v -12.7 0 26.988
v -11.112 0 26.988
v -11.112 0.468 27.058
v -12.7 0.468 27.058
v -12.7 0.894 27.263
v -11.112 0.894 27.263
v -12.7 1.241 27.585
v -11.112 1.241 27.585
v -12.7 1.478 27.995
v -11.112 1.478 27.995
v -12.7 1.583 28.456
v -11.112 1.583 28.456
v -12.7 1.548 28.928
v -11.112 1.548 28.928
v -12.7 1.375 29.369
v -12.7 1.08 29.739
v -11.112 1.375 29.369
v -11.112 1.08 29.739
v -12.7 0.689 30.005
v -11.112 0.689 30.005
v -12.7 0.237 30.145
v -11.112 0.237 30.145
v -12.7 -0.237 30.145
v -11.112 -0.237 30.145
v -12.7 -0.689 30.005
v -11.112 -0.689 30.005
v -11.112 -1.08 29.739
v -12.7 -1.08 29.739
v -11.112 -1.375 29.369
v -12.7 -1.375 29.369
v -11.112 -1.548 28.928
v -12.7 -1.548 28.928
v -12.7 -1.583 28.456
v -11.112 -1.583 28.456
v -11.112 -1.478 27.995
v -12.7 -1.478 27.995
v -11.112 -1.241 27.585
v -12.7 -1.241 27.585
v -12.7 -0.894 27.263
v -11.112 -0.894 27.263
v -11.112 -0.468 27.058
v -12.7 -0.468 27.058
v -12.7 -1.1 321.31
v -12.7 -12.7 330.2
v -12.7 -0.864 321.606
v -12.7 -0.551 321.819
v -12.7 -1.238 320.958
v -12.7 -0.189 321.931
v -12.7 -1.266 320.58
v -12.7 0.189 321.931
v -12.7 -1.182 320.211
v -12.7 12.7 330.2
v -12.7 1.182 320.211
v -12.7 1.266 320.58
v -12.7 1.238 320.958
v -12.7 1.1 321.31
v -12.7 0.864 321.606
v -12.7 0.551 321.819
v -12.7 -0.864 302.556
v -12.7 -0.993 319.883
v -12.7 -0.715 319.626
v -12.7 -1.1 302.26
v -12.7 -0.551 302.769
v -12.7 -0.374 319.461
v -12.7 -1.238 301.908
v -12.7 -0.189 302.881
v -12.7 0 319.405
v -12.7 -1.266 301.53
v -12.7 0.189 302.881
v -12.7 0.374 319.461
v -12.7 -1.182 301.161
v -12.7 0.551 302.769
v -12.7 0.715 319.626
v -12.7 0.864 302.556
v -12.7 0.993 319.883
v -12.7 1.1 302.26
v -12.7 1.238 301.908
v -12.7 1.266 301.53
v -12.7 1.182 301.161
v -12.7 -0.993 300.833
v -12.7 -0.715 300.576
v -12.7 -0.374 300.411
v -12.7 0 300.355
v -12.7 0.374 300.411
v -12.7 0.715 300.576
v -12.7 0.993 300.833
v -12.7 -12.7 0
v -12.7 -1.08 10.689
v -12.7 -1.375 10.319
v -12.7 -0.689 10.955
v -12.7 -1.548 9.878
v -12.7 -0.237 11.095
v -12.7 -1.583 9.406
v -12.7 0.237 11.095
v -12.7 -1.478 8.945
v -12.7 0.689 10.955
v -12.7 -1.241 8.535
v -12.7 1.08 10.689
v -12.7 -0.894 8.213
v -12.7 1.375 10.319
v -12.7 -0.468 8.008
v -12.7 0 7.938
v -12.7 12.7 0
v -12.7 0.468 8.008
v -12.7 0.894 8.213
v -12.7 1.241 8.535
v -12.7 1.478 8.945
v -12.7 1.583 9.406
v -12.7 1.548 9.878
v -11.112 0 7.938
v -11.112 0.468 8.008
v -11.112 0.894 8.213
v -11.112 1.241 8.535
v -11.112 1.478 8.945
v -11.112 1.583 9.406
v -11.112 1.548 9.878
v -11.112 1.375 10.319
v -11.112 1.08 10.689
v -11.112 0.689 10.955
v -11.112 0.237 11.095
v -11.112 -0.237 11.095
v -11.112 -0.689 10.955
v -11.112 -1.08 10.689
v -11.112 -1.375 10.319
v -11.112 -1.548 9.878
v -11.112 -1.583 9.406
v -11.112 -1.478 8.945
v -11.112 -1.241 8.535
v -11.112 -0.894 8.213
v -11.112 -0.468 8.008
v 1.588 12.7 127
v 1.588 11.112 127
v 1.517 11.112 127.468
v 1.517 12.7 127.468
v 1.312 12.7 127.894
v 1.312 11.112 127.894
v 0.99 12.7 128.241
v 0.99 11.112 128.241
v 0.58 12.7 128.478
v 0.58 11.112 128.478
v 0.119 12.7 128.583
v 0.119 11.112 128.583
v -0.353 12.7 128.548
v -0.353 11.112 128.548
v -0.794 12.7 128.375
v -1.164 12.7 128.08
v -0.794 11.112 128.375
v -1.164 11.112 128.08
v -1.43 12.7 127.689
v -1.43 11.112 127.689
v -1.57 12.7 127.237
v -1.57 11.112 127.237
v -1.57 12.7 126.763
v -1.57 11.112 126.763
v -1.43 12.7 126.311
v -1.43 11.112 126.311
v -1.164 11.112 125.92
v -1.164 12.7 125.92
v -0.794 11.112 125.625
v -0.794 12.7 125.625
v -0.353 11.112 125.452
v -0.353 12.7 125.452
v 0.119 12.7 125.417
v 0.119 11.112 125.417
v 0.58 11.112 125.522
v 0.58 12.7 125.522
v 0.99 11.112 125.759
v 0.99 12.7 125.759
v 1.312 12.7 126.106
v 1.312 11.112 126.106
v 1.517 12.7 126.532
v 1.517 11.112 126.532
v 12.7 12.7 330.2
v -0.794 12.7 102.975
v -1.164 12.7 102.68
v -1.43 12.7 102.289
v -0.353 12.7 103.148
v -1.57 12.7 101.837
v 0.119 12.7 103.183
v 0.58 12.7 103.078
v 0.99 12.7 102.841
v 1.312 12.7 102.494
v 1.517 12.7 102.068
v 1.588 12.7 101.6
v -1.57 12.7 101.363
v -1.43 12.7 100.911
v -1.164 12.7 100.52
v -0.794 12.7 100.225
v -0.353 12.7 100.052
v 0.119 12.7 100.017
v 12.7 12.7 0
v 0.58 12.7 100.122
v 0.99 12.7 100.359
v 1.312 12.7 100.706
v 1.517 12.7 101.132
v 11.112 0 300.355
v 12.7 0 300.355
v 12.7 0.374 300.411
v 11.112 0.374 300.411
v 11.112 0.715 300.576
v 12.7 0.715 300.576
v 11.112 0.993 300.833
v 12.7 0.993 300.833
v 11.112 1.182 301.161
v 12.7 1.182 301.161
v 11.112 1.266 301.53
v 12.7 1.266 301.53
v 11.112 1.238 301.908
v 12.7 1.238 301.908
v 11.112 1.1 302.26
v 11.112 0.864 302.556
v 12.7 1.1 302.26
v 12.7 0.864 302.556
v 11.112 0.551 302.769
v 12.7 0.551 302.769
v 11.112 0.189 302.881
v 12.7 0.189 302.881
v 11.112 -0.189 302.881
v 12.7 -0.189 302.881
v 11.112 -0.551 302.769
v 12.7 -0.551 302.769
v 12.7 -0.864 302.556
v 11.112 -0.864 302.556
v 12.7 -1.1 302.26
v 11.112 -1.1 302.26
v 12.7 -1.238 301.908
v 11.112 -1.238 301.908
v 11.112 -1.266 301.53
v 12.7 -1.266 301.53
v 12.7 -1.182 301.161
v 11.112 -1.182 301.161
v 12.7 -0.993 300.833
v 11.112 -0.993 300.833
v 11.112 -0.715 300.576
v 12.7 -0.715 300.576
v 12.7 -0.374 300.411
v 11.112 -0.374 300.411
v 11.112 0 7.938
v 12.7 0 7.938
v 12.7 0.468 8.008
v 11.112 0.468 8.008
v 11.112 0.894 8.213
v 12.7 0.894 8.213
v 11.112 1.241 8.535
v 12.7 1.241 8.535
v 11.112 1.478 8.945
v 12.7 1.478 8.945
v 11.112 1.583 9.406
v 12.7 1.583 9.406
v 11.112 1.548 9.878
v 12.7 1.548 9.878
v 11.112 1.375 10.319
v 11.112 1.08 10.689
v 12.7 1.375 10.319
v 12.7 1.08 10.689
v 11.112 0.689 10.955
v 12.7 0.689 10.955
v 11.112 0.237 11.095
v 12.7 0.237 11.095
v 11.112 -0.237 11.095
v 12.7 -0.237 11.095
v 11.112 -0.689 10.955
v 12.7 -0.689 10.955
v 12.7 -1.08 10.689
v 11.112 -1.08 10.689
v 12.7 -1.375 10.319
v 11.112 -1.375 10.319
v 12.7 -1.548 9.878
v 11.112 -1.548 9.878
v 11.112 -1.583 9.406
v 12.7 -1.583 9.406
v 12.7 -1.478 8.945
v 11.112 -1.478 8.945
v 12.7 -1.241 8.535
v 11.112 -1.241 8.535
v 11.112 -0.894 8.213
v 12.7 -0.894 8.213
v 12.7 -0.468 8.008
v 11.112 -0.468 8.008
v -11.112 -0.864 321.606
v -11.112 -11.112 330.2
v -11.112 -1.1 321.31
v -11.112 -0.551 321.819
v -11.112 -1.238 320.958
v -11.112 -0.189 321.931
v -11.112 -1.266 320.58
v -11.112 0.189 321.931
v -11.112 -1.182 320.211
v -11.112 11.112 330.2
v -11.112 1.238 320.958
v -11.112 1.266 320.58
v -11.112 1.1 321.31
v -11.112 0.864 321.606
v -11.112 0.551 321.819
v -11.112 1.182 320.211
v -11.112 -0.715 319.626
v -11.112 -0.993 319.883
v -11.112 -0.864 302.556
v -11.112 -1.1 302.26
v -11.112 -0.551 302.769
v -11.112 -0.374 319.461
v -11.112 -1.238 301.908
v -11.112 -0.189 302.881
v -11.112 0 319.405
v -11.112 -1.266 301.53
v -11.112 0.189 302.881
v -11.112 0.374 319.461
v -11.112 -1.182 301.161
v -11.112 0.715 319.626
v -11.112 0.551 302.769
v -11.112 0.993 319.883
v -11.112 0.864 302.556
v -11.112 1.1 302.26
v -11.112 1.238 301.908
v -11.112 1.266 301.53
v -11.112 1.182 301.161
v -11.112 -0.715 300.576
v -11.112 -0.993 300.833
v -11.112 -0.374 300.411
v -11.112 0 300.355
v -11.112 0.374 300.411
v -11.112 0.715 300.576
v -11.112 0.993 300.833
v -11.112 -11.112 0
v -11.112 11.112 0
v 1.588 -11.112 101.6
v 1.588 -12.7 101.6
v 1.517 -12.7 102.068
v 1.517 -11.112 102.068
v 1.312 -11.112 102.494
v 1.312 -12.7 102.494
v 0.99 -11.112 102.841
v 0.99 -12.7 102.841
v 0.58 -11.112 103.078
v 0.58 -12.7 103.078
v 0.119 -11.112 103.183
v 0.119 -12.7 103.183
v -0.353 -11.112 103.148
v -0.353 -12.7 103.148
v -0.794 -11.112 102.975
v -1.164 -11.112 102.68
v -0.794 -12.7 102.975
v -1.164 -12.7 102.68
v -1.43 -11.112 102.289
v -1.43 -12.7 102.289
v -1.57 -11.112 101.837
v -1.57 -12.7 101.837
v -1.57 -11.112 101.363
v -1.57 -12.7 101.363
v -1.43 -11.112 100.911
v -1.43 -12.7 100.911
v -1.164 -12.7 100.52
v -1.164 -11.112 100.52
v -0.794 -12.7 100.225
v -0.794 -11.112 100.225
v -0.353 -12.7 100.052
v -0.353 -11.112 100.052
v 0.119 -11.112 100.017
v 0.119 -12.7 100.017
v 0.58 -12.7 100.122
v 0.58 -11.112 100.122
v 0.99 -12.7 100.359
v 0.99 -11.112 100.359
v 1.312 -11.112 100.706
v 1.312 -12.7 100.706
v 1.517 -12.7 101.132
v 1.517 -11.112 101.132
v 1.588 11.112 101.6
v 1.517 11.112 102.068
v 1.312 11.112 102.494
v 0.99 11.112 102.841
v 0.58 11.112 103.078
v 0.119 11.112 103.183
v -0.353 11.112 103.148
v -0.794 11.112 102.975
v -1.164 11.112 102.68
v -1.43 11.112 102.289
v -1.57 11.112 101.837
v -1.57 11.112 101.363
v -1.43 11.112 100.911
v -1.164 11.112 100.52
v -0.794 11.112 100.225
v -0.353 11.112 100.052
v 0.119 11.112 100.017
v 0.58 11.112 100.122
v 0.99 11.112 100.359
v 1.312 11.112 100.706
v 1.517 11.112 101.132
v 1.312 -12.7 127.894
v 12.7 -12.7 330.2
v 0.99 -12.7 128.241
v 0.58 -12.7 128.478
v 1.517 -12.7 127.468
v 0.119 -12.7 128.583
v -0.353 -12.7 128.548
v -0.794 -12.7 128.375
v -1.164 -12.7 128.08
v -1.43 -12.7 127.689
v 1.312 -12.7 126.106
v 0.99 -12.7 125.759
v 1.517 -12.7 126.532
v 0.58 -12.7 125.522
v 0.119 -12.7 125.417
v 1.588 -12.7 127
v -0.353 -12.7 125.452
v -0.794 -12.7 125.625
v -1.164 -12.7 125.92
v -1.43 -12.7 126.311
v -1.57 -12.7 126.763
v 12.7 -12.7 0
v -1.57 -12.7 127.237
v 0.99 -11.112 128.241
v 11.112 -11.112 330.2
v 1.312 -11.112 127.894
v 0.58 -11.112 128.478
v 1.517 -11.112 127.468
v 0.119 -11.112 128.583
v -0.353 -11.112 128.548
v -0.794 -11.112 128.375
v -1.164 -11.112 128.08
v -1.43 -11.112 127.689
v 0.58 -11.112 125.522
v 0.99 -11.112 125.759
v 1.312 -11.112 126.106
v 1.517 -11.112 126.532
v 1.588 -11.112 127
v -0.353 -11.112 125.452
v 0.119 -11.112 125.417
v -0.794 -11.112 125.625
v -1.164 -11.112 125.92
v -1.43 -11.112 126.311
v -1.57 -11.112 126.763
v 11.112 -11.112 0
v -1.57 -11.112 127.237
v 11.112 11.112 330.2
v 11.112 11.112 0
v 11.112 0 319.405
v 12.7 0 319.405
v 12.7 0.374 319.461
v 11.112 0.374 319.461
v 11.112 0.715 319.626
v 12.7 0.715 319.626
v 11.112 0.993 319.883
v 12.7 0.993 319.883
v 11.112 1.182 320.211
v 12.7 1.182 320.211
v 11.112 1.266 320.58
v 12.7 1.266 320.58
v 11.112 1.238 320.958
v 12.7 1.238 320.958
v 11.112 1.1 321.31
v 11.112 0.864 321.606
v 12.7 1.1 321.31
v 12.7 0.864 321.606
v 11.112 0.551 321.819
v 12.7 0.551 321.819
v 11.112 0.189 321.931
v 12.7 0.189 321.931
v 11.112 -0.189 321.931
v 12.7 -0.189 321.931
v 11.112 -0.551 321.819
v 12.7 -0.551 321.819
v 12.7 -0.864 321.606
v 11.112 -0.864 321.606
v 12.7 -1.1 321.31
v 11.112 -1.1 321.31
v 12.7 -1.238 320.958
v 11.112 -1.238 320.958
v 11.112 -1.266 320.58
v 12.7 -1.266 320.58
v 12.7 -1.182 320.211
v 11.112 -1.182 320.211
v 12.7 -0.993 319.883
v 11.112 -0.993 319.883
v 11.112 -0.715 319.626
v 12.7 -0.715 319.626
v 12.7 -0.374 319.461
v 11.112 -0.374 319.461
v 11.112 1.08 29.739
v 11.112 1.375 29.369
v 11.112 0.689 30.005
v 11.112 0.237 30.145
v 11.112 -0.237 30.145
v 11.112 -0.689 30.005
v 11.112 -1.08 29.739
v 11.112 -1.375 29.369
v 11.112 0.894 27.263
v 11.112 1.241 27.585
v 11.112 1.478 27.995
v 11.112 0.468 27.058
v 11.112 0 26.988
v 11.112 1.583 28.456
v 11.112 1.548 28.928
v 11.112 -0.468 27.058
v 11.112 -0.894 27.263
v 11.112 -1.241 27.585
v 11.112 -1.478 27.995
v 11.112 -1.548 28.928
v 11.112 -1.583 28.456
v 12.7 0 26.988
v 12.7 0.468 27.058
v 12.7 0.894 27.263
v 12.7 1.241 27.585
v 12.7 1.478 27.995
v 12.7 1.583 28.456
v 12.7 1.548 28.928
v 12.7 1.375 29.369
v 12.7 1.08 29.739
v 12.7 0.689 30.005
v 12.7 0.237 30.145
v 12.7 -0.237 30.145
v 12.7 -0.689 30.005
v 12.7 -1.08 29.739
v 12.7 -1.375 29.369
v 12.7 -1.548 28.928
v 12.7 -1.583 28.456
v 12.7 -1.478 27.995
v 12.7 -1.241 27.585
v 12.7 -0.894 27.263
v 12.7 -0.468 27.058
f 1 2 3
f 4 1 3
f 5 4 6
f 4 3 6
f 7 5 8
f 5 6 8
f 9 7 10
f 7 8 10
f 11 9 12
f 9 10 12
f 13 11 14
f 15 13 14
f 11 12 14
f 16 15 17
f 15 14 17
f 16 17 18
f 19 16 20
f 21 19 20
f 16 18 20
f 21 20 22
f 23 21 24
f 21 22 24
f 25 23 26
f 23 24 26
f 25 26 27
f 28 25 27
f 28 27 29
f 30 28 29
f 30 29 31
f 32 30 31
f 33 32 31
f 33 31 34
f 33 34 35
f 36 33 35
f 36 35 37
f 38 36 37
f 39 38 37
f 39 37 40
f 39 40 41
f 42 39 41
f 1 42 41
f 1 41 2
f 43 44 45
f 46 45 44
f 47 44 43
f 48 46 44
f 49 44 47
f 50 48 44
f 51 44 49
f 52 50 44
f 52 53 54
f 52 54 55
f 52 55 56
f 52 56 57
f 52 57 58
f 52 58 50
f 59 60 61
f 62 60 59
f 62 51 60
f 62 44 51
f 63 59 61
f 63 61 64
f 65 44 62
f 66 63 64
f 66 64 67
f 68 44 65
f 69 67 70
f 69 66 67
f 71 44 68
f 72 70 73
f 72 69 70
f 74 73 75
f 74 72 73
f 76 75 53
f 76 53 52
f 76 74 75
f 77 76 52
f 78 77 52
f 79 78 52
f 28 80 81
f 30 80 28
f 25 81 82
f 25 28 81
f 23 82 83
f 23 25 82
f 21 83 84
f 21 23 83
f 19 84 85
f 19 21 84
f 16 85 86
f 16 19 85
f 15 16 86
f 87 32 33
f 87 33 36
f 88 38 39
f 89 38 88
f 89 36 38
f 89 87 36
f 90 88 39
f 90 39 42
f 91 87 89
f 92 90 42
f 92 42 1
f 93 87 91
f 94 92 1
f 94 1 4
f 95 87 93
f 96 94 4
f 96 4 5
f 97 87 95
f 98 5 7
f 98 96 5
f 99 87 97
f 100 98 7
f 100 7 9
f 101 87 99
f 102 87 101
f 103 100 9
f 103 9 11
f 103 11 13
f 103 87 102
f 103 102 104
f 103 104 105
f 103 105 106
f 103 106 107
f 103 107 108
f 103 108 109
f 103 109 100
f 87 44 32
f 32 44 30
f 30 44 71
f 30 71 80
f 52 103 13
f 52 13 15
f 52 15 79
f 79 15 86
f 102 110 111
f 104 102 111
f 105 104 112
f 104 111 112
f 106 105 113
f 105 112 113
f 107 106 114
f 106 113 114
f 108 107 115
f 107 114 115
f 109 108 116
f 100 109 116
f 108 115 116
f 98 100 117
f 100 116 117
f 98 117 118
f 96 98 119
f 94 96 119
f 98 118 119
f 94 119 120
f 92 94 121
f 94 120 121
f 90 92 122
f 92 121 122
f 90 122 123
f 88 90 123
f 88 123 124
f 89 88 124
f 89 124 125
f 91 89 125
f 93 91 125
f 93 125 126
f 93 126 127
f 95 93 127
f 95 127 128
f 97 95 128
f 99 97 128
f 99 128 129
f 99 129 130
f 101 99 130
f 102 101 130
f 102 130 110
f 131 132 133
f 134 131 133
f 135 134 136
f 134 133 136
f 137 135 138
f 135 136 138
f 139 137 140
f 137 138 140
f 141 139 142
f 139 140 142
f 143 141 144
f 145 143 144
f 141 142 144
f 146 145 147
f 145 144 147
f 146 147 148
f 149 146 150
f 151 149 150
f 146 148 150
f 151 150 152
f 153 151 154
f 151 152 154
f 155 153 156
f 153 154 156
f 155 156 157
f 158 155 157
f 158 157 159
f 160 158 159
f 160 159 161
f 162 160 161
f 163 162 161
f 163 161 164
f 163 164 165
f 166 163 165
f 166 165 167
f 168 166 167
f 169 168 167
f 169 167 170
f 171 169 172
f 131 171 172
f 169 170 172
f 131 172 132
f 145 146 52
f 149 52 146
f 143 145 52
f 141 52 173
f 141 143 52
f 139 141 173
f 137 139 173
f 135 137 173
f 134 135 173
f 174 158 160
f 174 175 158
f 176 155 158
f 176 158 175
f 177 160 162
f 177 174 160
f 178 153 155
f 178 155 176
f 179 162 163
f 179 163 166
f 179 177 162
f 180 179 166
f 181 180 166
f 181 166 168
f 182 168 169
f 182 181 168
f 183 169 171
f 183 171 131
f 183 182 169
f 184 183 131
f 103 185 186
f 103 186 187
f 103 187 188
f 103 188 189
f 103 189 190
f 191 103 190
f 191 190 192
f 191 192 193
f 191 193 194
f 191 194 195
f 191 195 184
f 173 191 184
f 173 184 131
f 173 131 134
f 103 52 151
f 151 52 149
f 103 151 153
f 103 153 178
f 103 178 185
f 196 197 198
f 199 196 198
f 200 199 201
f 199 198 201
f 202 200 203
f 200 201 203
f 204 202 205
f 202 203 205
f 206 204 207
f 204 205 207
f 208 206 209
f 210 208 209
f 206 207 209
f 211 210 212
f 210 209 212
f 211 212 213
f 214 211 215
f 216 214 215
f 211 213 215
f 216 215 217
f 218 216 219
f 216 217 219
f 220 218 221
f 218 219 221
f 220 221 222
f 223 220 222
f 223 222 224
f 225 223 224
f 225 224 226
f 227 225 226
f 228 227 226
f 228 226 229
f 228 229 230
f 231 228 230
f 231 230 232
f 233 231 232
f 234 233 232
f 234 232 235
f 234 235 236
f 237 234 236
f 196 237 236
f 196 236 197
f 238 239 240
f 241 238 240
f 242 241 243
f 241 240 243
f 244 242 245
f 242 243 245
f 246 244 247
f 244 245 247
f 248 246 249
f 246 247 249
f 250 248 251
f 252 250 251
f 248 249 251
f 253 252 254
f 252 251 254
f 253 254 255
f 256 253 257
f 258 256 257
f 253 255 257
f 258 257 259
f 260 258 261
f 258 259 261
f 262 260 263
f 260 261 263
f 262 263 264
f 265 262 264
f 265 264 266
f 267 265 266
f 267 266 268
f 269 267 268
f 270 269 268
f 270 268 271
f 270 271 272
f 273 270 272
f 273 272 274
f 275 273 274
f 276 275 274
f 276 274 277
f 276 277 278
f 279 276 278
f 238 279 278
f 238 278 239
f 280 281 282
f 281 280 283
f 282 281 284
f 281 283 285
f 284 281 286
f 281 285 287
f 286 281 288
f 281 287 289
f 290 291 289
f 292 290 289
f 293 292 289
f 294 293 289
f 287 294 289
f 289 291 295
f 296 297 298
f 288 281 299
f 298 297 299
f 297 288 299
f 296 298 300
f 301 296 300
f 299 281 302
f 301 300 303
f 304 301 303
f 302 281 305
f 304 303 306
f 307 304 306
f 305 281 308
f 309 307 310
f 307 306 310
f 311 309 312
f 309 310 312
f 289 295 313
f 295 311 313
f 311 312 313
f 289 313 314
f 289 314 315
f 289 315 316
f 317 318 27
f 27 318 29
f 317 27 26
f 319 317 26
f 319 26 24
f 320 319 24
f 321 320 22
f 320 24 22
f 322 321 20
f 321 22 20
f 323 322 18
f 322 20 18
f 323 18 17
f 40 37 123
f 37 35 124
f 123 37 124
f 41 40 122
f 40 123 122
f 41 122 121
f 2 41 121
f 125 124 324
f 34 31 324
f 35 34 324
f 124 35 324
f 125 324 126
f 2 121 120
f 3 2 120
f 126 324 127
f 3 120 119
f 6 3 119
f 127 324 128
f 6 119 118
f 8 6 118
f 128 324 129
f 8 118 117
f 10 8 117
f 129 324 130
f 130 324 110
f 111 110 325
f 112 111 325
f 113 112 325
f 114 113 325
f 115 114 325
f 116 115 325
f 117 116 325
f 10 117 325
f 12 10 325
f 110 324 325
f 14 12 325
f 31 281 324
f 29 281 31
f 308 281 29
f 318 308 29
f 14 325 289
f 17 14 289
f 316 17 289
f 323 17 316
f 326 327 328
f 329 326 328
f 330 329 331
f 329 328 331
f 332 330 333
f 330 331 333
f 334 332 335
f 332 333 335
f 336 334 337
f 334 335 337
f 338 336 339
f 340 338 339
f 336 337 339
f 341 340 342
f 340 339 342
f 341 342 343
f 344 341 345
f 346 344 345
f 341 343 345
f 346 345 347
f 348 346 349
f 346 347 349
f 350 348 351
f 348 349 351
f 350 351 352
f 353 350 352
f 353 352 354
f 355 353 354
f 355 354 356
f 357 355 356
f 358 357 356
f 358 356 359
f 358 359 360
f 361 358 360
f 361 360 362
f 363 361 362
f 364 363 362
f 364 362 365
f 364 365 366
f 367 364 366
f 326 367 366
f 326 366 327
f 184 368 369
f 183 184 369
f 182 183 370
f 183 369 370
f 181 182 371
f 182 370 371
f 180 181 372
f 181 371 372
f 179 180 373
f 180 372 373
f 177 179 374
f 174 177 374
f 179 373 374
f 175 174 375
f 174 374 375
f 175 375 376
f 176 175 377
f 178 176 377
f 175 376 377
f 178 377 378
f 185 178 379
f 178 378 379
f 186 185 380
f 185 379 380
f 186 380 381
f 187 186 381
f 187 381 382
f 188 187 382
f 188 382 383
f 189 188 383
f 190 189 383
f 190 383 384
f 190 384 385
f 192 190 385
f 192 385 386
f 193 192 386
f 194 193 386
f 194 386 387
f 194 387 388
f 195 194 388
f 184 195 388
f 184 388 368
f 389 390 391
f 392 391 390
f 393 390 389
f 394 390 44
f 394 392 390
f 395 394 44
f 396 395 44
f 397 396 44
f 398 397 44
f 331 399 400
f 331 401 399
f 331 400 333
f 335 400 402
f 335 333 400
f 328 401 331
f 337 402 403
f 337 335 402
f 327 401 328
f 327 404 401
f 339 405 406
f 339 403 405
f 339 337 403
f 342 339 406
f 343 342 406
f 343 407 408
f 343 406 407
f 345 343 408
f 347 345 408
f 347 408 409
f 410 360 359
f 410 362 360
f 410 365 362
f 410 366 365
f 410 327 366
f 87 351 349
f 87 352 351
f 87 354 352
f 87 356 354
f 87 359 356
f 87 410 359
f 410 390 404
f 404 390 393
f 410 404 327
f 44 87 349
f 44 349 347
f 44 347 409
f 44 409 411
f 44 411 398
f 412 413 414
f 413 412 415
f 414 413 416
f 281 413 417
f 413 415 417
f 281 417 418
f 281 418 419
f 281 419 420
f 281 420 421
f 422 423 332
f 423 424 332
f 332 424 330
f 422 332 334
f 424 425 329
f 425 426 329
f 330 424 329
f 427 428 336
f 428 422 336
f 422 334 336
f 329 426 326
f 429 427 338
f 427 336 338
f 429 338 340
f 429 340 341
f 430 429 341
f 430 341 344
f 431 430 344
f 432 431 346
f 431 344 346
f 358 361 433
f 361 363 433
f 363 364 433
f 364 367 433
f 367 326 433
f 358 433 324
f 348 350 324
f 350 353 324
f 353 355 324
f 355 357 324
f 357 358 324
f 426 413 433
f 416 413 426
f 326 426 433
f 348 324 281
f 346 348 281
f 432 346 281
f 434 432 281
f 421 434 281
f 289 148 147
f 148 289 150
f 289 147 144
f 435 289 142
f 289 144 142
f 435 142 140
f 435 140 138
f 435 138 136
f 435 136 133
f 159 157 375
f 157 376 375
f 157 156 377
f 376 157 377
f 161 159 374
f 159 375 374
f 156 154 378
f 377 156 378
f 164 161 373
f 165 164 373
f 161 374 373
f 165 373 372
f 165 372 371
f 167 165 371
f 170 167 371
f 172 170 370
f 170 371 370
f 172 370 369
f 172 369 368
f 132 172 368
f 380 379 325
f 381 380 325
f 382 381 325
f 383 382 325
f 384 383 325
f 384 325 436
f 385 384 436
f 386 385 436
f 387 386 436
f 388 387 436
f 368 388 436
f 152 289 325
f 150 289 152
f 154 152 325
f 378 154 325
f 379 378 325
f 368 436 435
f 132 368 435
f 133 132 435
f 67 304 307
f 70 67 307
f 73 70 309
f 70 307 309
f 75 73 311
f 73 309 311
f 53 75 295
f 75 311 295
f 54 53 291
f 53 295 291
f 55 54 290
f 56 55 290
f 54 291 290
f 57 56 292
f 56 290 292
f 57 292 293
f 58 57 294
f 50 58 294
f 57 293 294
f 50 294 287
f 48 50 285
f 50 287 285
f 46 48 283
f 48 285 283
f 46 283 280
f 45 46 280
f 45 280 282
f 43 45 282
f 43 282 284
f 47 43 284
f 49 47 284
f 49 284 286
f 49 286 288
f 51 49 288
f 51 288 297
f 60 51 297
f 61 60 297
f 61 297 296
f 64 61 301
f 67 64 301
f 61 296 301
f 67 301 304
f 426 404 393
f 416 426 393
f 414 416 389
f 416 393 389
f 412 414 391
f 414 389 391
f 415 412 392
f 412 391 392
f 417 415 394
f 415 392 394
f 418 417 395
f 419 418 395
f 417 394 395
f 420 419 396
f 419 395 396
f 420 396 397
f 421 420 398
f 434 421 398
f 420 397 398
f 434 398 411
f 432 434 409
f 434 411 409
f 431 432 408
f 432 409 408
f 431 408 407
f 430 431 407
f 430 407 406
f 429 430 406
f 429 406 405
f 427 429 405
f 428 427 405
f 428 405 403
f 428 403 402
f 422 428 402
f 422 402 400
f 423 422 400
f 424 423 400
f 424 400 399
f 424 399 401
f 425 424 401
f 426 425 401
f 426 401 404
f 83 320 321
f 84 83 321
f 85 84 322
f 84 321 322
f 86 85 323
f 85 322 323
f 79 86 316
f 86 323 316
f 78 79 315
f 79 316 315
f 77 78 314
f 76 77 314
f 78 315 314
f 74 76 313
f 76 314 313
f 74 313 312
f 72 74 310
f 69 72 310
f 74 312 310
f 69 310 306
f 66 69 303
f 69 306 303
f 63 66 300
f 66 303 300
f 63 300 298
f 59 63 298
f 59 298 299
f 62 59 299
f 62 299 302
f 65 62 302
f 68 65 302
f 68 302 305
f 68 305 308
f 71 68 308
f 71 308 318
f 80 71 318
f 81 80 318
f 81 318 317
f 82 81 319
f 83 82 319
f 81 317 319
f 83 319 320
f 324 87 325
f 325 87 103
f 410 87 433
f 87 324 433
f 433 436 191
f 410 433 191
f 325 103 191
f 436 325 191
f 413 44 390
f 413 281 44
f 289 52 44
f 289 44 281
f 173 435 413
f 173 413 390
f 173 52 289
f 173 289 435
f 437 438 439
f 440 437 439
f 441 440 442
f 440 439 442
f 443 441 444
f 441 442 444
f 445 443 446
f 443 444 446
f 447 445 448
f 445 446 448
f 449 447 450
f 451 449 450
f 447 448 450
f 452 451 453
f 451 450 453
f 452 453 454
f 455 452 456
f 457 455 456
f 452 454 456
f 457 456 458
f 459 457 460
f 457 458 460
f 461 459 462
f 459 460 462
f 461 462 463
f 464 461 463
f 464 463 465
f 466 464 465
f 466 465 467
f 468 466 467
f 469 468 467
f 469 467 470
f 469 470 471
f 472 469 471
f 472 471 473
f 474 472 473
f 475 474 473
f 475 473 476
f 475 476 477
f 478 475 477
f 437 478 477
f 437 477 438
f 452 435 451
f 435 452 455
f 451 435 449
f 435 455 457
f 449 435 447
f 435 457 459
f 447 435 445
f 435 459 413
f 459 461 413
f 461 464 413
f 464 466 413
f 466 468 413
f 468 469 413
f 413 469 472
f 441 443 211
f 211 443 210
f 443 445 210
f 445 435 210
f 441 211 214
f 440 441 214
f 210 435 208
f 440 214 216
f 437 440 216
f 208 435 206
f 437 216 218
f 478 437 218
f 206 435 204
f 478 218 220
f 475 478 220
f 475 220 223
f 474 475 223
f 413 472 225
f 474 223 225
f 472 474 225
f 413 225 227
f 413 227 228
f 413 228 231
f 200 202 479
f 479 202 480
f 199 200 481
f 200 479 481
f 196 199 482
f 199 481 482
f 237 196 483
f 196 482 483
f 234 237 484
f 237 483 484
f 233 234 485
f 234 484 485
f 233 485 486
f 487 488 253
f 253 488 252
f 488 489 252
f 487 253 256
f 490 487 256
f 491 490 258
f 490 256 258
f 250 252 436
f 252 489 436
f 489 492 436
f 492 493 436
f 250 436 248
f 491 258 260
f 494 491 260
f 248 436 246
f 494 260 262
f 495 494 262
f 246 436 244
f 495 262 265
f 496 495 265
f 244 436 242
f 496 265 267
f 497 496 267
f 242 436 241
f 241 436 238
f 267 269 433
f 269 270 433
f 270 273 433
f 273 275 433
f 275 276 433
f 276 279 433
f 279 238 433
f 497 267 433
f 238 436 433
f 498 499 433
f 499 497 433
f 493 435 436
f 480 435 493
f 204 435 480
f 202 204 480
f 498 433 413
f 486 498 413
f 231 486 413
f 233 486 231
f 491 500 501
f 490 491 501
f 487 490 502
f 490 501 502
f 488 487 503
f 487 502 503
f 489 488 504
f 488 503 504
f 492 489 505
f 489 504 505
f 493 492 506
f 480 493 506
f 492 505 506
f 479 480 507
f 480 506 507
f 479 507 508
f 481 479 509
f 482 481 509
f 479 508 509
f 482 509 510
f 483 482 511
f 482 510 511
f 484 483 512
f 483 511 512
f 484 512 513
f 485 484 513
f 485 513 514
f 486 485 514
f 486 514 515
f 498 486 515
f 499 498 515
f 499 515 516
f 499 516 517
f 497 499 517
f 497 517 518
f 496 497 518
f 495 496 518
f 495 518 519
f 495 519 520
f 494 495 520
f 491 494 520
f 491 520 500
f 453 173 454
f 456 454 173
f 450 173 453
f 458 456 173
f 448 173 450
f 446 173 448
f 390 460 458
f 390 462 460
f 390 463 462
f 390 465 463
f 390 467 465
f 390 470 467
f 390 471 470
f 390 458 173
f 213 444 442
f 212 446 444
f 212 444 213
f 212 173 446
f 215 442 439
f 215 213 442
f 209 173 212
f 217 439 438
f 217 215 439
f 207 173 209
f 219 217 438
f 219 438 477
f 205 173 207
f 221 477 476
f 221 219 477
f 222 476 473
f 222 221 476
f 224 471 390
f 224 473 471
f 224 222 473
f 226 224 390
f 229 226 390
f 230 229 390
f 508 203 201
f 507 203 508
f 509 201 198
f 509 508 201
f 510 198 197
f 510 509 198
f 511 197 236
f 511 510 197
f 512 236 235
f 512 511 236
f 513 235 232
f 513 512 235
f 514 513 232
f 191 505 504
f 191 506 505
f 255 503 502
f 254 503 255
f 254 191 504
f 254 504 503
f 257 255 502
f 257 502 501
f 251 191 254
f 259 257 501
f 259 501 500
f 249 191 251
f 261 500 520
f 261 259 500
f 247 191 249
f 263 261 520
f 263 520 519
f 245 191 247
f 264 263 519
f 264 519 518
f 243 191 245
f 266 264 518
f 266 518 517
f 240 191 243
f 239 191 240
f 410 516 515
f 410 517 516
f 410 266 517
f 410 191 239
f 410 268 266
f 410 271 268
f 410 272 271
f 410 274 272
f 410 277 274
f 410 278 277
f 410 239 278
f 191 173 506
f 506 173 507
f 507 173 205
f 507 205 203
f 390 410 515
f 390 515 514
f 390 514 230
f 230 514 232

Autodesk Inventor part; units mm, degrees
ref_plane "YZ Plane" through (0, 0, 0) normal (1, 0, 0) x (0, 1, 0)
ref_plane "XZ Plane" through (0, 0, 0) normal (0, 1, 0) x (-1, 0, 0)
ref_plane "XY Plane" through (0, 0, 0) normal (0, 0, 1) x (1, 0, 0)
sketch "Sketch1" plane through (0, 0, 0) normal (0, 0, 1) x (1, 0, 0)
  line L0 (0, 0) -> (-11.1125, 0) construction
  line L1 (0, 0) -> (0, 11.1125) construction
  line L2 (-11.1125, 11.1125) -> (11.1125, 11.1125)
  line L3 (11.1125, 11.1125) -> (11.1125, -11.1125)
  line L4 (11.1125, -11.1125) -> (-11.1125, -11.1125)
  line L5 (-11.1125, -11.1125) -> (-11.1125, 11.1125)
  line L6 (-12.7, 12.7) -> (12.7, 12.7)
  line L7 (12.7, 12.7) -> (12.7, -12.7)
  line L8 (12.7, -12.7) -> (-12.7, -12.7)
  line L9 (-12.7, -12.7) -> (-12.7, 12.7)
  line L10 (-11.1125, 0) -> (-12.7, 0) construction
  line L11 (0, 11.1125) -> (0, 12.7) construction
  dimension "d0" = 25.4
  dimension "d1" = 1.5875
extrude "Extrusion1" add sketch "Sketch1" along normal blind 330.2
sketch "Sketch2" plane through (12.7, -12.7, 0) normal (1, 0, 0) x (0, 0, -1)
  line L0 (0, 12.7) -> (-330.2, 12.7) construction
  line L1 (-330.2, 1.5875) -> (-330.2, 23.8125) construction
  circle A0 centre (-320.675, 12.7) radius 1.27
  circle A1 centre (-301.625, 12.7) radius 1.27
  circle A2 centre (-9.525, 12.7) radius 1.5875
  circle A3 centre (-28.575, 12.7) radius 1.5875
  dimension "d4" = 2.54
  dimension "d5" = 19.05
  dimension "d6" = 9.525
  dimension "d7" = 3.175
  dimension "d8" = 19.05
  dimension "d9" = 9.525
extrude "Extrusion2" cut sketch "Sketch2" against normal through all
sketch "Sketch3" plane through (-12.7, -12.7, 0) normal (0, -1, 0) x (1, 0, 0)
  circle A0 centre (12.7, 127) radius 1.5875
  circle A1 centre (12.7, 101.6) radius 1.5875
  line L0 (0, 0) -> (25.4, 0) construction
  line L1 (12.7, 0) -> (12.7, 101.6) construction
  line L2 (12.7, 101.6) -> (12.7, 127) construction
  line L3 (12.7, 114.3) -> (0, 114.3) construction
  line L4 (1.5875, 0) -> (1.5875, 330.2) construction
  dimension "d12" = 3.175
  dimension "d13" = 114.3
  dimension "d14" = 25.4
extrude "Extrusion3" cut sketch "Sketch3" against normal through all
properties part number "Short Side" material "Aluminum 6061"
